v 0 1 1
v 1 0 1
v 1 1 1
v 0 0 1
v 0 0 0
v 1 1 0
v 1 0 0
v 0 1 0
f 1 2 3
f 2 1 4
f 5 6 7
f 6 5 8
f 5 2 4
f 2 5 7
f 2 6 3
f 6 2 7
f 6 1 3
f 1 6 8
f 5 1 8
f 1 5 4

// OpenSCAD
// Volume: 1, SurfaceArea: 6
// Test a mix of toplevel 2D and 3D objects
cube();
translate([2,0,0]) square();

// Test mixing of empty 2D and 3D objects
union() {
    cube(0);
    circle(0);
}
